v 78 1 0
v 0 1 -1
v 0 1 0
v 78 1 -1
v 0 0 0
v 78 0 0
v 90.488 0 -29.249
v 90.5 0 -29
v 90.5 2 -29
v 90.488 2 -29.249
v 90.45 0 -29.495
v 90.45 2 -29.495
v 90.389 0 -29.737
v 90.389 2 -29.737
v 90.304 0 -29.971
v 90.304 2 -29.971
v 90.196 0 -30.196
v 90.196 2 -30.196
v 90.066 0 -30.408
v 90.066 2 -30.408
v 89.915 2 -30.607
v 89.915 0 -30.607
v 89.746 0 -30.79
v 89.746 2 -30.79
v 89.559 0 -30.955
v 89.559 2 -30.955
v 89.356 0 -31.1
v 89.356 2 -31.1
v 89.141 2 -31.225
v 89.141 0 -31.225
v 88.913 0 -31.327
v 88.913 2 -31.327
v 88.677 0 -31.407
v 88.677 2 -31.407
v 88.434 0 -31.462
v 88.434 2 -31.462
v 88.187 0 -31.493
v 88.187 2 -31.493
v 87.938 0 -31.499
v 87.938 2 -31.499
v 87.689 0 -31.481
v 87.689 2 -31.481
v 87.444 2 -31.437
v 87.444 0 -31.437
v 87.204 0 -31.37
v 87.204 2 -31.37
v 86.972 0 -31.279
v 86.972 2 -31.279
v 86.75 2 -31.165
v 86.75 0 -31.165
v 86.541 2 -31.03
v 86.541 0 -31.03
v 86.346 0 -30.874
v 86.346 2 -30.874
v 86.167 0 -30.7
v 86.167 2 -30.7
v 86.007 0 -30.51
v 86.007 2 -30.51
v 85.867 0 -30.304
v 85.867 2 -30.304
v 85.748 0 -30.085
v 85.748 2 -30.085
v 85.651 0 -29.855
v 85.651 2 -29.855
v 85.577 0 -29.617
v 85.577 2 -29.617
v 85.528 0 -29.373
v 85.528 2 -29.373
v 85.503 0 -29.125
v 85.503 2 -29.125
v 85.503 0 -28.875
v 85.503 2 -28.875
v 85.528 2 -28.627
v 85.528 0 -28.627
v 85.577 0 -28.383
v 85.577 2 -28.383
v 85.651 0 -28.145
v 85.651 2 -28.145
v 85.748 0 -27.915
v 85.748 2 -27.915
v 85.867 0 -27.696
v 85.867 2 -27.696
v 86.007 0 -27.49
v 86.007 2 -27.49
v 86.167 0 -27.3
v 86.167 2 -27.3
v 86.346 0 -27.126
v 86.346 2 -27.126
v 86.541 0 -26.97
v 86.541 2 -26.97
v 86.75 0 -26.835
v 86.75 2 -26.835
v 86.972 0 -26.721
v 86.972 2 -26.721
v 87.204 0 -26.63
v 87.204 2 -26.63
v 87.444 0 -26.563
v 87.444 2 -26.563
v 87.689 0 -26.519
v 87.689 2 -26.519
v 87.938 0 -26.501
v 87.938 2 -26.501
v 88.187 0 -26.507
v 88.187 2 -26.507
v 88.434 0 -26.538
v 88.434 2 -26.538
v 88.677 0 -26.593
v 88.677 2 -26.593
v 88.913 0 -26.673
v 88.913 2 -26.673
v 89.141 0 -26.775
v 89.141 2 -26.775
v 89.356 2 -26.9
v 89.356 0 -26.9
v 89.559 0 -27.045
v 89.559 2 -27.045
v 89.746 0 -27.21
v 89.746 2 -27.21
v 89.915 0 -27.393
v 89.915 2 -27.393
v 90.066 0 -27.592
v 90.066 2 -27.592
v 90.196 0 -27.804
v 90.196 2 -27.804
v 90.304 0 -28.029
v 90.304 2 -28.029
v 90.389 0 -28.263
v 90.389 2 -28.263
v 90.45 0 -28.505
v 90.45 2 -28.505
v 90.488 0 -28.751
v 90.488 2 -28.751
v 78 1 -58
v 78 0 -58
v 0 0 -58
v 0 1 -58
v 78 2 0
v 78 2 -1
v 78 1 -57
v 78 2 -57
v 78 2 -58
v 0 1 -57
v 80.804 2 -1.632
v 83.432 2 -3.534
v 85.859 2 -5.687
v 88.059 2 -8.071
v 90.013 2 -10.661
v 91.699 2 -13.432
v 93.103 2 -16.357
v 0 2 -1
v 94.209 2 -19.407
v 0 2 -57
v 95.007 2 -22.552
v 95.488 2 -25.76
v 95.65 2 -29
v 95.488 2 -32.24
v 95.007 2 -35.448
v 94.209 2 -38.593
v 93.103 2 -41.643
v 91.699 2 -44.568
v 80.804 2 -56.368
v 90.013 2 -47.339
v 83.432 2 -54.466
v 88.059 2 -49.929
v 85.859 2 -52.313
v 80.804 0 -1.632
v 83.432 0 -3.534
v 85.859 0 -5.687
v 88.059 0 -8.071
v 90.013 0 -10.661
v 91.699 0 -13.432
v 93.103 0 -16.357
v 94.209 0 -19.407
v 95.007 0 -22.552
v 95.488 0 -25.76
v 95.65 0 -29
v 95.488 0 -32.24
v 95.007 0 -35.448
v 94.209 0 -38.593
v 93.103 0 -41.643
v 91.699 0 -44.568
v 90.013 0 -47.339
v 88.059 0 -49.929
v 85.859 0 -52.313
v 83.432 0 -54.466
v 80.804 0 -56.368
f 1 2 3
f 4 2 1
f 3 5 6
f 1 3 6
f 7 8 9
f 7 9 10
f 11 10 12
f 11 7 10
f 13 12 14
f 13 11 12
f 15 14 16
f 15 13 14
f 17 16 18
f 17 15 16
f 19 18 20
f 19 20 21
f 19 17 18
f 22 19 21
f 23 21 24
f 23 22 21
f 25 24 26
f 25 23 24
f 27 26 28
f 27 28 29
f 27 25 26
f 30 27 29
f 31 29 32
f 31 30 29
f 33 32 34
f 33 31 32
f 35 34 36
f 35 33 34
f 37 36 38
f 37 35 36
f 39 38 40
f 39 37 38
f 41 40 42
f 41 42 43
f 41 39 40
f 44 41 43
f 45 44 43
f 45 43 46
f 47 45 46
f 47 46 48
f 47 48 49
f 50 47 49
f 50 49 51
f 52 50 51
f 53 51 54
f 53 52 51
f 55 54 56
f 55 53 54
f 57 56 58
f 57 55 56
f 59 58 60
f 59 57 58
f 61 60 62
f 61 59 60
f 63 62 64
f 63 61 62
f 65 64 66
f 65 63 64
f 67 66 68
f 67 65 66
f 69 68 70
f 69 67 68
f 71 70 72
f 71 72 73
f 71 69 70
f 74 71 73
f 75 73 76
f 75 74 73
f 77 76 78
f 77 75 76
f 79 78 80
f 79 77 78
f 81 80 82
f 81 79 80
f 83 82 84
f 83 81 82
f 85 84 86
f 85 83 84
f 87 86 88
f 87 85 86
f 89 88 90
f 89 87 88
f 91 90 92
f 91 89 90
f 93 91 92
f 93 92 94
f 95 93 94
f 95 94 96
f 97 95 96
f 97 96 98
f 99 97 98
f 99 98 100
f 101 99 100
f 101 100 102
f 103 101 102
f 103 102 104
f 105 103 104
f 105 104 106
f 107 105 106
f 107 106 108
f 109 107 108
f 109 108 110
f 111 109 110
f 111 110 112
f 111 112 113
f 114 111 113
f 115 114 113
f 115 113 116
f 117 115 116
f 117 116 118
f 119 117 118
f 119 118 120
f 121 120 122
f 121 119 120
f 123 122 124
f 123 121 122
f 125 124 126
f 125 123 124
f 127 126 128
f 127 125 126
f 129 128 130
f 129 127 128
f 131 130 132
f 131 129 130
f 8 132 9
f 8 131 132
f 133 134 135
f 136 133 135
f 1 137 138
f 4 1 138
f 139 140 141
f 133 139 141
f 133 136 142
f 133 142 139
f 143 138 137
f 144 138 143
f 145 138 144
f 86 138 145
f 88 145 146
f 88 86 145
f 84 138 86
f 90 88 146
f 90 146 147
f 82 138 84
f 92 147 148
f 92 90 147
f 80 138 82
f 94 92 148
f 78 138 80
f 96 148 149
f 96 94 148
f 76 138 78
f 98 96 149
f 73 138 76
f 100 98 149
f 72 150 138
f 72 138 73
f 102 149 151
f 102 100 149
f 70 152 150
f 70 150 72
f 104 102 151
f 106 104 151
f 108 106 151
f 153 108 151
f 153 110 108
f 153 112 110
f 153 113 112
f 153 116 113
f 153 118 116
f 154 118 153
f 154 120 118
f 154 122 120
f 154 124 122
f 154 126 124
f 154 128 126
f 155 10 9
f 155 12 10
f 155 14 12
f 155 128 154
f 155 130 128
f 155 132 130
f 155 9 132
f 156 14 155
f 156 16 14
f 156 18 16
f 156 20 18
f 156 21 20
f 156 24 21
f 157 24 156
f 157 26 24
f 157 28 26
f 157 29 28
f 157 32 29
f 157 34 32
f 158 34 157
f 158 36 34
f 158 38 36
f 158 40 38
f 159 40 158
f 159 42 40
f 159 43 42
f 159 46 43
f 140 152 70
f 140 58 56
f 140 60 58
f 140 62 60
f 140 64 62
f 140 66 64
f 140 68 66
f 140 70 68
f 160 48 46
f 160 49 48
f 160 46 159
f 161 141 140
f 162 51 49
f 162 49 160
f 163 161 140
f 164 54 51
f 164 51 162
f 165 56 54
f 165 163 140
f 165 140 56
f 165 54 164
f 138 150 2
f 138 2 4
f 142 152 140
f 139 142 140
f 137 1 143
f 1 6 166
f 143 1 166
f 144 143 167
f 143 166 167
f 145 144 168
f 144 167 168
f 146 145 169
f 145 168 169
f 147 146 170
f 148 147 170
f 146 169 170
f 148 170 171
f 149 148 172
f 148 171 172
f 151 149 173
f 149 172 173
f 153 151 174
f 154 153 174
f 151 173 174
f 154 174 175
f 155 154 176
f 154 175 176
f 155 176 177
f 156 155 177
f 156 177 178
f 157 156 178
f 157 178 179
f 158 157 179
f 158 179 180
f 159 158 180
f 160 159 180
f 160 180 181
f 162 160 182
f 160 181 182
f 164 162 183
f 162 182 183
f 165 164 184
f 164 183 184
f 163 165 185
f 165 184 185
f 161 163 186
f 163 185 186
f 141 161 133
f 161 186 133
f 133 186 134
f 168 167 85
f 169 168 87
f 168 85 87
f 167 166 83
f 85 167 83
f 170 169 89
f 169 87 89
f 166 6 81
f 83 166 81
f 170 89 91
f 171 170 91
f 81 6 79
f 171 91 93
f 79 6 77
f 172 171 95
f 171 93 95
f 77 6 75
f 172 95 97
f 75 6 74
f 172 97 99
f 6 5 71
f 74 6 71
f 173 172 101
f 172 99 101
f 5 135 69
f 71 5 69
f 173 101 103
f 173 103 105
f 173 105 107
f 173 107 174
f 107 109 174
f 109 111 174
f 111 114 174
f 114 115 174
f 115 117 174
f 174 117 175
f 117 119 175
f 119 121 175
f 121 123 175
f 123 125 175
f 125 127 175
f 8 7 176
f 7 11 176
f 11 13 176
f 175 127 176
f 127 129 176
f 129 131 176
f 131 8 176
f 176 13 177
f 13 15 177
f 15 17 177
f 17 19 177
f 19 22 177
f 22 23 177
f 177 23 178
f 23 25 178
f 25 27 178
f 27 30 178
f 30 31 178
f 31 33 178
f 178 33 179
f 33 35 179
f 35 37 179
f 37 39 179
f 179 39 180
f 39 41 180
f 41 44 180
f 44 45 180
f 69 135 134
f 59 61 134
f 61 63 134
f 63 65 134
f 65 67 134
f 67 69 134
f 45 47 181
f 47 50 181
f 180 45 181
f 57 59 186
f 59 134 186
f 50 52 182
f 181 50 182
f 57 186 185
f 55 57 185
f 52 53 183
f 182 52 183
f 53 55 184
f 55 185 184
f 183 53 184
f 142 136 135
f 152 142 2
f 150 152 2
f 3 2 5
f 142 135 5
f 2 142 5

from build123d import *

# Parameters (mm, degrees)
SKIZZE1_R                       = 2.5
AUFSATZ_LINEAR_AUSTRAGEN1_DEPTH = 2
SKIZZE2_W                       = 78
SKIZZE2_H                       = 1
SCHNITT_LINEAR_AUSTRAGEN1_DEPTH = 1


with BuildPart() as part:
    # Skizze1 → Aufsatz-Linear austragen1 (new body)
    with BuildSketch(Plane(origin=(0, 0, 0), x_dir=(1, 0, 0), z_dir=(0, 1, 0))):
        with BuildLine():
            Line((0, 0), (78, 0))
            ThreePointArc((78, 0), (95.649655435, 29), (78, 58))
            Line((78, 58), (0, 58))
            Line((0, 58), (0, 0))
        make_face()
        with Locations((88, 29)):
            Circle(SKIZZE1_R, mode=Mode.SUBTRACT)
    extrude(amount=AUFSATZ_LINEAR_AUSTRAGEN1_DEPTH)

    # Skizze2 → Schnitt-Linear austragen1 (cut)
    with BuildSketch(Plane(origin=(0, 2, 0), x_dir=(1, 0, 0), z_dir=(0, 1, 0))):
        with Locations((39, 57.5)):
            Rectangle(SKIZZE2_W, SKIZZE2_H)
        with Locations((39, 0.5)):
            Rectangle(SKIZZE2_W, SKIZZE2_H)
    extrude(amount=-SCHNITT_LINEAR_AUSTRAGEN1_DEPTH, mode=Mode.SUBTRACT)


solid = part.part
